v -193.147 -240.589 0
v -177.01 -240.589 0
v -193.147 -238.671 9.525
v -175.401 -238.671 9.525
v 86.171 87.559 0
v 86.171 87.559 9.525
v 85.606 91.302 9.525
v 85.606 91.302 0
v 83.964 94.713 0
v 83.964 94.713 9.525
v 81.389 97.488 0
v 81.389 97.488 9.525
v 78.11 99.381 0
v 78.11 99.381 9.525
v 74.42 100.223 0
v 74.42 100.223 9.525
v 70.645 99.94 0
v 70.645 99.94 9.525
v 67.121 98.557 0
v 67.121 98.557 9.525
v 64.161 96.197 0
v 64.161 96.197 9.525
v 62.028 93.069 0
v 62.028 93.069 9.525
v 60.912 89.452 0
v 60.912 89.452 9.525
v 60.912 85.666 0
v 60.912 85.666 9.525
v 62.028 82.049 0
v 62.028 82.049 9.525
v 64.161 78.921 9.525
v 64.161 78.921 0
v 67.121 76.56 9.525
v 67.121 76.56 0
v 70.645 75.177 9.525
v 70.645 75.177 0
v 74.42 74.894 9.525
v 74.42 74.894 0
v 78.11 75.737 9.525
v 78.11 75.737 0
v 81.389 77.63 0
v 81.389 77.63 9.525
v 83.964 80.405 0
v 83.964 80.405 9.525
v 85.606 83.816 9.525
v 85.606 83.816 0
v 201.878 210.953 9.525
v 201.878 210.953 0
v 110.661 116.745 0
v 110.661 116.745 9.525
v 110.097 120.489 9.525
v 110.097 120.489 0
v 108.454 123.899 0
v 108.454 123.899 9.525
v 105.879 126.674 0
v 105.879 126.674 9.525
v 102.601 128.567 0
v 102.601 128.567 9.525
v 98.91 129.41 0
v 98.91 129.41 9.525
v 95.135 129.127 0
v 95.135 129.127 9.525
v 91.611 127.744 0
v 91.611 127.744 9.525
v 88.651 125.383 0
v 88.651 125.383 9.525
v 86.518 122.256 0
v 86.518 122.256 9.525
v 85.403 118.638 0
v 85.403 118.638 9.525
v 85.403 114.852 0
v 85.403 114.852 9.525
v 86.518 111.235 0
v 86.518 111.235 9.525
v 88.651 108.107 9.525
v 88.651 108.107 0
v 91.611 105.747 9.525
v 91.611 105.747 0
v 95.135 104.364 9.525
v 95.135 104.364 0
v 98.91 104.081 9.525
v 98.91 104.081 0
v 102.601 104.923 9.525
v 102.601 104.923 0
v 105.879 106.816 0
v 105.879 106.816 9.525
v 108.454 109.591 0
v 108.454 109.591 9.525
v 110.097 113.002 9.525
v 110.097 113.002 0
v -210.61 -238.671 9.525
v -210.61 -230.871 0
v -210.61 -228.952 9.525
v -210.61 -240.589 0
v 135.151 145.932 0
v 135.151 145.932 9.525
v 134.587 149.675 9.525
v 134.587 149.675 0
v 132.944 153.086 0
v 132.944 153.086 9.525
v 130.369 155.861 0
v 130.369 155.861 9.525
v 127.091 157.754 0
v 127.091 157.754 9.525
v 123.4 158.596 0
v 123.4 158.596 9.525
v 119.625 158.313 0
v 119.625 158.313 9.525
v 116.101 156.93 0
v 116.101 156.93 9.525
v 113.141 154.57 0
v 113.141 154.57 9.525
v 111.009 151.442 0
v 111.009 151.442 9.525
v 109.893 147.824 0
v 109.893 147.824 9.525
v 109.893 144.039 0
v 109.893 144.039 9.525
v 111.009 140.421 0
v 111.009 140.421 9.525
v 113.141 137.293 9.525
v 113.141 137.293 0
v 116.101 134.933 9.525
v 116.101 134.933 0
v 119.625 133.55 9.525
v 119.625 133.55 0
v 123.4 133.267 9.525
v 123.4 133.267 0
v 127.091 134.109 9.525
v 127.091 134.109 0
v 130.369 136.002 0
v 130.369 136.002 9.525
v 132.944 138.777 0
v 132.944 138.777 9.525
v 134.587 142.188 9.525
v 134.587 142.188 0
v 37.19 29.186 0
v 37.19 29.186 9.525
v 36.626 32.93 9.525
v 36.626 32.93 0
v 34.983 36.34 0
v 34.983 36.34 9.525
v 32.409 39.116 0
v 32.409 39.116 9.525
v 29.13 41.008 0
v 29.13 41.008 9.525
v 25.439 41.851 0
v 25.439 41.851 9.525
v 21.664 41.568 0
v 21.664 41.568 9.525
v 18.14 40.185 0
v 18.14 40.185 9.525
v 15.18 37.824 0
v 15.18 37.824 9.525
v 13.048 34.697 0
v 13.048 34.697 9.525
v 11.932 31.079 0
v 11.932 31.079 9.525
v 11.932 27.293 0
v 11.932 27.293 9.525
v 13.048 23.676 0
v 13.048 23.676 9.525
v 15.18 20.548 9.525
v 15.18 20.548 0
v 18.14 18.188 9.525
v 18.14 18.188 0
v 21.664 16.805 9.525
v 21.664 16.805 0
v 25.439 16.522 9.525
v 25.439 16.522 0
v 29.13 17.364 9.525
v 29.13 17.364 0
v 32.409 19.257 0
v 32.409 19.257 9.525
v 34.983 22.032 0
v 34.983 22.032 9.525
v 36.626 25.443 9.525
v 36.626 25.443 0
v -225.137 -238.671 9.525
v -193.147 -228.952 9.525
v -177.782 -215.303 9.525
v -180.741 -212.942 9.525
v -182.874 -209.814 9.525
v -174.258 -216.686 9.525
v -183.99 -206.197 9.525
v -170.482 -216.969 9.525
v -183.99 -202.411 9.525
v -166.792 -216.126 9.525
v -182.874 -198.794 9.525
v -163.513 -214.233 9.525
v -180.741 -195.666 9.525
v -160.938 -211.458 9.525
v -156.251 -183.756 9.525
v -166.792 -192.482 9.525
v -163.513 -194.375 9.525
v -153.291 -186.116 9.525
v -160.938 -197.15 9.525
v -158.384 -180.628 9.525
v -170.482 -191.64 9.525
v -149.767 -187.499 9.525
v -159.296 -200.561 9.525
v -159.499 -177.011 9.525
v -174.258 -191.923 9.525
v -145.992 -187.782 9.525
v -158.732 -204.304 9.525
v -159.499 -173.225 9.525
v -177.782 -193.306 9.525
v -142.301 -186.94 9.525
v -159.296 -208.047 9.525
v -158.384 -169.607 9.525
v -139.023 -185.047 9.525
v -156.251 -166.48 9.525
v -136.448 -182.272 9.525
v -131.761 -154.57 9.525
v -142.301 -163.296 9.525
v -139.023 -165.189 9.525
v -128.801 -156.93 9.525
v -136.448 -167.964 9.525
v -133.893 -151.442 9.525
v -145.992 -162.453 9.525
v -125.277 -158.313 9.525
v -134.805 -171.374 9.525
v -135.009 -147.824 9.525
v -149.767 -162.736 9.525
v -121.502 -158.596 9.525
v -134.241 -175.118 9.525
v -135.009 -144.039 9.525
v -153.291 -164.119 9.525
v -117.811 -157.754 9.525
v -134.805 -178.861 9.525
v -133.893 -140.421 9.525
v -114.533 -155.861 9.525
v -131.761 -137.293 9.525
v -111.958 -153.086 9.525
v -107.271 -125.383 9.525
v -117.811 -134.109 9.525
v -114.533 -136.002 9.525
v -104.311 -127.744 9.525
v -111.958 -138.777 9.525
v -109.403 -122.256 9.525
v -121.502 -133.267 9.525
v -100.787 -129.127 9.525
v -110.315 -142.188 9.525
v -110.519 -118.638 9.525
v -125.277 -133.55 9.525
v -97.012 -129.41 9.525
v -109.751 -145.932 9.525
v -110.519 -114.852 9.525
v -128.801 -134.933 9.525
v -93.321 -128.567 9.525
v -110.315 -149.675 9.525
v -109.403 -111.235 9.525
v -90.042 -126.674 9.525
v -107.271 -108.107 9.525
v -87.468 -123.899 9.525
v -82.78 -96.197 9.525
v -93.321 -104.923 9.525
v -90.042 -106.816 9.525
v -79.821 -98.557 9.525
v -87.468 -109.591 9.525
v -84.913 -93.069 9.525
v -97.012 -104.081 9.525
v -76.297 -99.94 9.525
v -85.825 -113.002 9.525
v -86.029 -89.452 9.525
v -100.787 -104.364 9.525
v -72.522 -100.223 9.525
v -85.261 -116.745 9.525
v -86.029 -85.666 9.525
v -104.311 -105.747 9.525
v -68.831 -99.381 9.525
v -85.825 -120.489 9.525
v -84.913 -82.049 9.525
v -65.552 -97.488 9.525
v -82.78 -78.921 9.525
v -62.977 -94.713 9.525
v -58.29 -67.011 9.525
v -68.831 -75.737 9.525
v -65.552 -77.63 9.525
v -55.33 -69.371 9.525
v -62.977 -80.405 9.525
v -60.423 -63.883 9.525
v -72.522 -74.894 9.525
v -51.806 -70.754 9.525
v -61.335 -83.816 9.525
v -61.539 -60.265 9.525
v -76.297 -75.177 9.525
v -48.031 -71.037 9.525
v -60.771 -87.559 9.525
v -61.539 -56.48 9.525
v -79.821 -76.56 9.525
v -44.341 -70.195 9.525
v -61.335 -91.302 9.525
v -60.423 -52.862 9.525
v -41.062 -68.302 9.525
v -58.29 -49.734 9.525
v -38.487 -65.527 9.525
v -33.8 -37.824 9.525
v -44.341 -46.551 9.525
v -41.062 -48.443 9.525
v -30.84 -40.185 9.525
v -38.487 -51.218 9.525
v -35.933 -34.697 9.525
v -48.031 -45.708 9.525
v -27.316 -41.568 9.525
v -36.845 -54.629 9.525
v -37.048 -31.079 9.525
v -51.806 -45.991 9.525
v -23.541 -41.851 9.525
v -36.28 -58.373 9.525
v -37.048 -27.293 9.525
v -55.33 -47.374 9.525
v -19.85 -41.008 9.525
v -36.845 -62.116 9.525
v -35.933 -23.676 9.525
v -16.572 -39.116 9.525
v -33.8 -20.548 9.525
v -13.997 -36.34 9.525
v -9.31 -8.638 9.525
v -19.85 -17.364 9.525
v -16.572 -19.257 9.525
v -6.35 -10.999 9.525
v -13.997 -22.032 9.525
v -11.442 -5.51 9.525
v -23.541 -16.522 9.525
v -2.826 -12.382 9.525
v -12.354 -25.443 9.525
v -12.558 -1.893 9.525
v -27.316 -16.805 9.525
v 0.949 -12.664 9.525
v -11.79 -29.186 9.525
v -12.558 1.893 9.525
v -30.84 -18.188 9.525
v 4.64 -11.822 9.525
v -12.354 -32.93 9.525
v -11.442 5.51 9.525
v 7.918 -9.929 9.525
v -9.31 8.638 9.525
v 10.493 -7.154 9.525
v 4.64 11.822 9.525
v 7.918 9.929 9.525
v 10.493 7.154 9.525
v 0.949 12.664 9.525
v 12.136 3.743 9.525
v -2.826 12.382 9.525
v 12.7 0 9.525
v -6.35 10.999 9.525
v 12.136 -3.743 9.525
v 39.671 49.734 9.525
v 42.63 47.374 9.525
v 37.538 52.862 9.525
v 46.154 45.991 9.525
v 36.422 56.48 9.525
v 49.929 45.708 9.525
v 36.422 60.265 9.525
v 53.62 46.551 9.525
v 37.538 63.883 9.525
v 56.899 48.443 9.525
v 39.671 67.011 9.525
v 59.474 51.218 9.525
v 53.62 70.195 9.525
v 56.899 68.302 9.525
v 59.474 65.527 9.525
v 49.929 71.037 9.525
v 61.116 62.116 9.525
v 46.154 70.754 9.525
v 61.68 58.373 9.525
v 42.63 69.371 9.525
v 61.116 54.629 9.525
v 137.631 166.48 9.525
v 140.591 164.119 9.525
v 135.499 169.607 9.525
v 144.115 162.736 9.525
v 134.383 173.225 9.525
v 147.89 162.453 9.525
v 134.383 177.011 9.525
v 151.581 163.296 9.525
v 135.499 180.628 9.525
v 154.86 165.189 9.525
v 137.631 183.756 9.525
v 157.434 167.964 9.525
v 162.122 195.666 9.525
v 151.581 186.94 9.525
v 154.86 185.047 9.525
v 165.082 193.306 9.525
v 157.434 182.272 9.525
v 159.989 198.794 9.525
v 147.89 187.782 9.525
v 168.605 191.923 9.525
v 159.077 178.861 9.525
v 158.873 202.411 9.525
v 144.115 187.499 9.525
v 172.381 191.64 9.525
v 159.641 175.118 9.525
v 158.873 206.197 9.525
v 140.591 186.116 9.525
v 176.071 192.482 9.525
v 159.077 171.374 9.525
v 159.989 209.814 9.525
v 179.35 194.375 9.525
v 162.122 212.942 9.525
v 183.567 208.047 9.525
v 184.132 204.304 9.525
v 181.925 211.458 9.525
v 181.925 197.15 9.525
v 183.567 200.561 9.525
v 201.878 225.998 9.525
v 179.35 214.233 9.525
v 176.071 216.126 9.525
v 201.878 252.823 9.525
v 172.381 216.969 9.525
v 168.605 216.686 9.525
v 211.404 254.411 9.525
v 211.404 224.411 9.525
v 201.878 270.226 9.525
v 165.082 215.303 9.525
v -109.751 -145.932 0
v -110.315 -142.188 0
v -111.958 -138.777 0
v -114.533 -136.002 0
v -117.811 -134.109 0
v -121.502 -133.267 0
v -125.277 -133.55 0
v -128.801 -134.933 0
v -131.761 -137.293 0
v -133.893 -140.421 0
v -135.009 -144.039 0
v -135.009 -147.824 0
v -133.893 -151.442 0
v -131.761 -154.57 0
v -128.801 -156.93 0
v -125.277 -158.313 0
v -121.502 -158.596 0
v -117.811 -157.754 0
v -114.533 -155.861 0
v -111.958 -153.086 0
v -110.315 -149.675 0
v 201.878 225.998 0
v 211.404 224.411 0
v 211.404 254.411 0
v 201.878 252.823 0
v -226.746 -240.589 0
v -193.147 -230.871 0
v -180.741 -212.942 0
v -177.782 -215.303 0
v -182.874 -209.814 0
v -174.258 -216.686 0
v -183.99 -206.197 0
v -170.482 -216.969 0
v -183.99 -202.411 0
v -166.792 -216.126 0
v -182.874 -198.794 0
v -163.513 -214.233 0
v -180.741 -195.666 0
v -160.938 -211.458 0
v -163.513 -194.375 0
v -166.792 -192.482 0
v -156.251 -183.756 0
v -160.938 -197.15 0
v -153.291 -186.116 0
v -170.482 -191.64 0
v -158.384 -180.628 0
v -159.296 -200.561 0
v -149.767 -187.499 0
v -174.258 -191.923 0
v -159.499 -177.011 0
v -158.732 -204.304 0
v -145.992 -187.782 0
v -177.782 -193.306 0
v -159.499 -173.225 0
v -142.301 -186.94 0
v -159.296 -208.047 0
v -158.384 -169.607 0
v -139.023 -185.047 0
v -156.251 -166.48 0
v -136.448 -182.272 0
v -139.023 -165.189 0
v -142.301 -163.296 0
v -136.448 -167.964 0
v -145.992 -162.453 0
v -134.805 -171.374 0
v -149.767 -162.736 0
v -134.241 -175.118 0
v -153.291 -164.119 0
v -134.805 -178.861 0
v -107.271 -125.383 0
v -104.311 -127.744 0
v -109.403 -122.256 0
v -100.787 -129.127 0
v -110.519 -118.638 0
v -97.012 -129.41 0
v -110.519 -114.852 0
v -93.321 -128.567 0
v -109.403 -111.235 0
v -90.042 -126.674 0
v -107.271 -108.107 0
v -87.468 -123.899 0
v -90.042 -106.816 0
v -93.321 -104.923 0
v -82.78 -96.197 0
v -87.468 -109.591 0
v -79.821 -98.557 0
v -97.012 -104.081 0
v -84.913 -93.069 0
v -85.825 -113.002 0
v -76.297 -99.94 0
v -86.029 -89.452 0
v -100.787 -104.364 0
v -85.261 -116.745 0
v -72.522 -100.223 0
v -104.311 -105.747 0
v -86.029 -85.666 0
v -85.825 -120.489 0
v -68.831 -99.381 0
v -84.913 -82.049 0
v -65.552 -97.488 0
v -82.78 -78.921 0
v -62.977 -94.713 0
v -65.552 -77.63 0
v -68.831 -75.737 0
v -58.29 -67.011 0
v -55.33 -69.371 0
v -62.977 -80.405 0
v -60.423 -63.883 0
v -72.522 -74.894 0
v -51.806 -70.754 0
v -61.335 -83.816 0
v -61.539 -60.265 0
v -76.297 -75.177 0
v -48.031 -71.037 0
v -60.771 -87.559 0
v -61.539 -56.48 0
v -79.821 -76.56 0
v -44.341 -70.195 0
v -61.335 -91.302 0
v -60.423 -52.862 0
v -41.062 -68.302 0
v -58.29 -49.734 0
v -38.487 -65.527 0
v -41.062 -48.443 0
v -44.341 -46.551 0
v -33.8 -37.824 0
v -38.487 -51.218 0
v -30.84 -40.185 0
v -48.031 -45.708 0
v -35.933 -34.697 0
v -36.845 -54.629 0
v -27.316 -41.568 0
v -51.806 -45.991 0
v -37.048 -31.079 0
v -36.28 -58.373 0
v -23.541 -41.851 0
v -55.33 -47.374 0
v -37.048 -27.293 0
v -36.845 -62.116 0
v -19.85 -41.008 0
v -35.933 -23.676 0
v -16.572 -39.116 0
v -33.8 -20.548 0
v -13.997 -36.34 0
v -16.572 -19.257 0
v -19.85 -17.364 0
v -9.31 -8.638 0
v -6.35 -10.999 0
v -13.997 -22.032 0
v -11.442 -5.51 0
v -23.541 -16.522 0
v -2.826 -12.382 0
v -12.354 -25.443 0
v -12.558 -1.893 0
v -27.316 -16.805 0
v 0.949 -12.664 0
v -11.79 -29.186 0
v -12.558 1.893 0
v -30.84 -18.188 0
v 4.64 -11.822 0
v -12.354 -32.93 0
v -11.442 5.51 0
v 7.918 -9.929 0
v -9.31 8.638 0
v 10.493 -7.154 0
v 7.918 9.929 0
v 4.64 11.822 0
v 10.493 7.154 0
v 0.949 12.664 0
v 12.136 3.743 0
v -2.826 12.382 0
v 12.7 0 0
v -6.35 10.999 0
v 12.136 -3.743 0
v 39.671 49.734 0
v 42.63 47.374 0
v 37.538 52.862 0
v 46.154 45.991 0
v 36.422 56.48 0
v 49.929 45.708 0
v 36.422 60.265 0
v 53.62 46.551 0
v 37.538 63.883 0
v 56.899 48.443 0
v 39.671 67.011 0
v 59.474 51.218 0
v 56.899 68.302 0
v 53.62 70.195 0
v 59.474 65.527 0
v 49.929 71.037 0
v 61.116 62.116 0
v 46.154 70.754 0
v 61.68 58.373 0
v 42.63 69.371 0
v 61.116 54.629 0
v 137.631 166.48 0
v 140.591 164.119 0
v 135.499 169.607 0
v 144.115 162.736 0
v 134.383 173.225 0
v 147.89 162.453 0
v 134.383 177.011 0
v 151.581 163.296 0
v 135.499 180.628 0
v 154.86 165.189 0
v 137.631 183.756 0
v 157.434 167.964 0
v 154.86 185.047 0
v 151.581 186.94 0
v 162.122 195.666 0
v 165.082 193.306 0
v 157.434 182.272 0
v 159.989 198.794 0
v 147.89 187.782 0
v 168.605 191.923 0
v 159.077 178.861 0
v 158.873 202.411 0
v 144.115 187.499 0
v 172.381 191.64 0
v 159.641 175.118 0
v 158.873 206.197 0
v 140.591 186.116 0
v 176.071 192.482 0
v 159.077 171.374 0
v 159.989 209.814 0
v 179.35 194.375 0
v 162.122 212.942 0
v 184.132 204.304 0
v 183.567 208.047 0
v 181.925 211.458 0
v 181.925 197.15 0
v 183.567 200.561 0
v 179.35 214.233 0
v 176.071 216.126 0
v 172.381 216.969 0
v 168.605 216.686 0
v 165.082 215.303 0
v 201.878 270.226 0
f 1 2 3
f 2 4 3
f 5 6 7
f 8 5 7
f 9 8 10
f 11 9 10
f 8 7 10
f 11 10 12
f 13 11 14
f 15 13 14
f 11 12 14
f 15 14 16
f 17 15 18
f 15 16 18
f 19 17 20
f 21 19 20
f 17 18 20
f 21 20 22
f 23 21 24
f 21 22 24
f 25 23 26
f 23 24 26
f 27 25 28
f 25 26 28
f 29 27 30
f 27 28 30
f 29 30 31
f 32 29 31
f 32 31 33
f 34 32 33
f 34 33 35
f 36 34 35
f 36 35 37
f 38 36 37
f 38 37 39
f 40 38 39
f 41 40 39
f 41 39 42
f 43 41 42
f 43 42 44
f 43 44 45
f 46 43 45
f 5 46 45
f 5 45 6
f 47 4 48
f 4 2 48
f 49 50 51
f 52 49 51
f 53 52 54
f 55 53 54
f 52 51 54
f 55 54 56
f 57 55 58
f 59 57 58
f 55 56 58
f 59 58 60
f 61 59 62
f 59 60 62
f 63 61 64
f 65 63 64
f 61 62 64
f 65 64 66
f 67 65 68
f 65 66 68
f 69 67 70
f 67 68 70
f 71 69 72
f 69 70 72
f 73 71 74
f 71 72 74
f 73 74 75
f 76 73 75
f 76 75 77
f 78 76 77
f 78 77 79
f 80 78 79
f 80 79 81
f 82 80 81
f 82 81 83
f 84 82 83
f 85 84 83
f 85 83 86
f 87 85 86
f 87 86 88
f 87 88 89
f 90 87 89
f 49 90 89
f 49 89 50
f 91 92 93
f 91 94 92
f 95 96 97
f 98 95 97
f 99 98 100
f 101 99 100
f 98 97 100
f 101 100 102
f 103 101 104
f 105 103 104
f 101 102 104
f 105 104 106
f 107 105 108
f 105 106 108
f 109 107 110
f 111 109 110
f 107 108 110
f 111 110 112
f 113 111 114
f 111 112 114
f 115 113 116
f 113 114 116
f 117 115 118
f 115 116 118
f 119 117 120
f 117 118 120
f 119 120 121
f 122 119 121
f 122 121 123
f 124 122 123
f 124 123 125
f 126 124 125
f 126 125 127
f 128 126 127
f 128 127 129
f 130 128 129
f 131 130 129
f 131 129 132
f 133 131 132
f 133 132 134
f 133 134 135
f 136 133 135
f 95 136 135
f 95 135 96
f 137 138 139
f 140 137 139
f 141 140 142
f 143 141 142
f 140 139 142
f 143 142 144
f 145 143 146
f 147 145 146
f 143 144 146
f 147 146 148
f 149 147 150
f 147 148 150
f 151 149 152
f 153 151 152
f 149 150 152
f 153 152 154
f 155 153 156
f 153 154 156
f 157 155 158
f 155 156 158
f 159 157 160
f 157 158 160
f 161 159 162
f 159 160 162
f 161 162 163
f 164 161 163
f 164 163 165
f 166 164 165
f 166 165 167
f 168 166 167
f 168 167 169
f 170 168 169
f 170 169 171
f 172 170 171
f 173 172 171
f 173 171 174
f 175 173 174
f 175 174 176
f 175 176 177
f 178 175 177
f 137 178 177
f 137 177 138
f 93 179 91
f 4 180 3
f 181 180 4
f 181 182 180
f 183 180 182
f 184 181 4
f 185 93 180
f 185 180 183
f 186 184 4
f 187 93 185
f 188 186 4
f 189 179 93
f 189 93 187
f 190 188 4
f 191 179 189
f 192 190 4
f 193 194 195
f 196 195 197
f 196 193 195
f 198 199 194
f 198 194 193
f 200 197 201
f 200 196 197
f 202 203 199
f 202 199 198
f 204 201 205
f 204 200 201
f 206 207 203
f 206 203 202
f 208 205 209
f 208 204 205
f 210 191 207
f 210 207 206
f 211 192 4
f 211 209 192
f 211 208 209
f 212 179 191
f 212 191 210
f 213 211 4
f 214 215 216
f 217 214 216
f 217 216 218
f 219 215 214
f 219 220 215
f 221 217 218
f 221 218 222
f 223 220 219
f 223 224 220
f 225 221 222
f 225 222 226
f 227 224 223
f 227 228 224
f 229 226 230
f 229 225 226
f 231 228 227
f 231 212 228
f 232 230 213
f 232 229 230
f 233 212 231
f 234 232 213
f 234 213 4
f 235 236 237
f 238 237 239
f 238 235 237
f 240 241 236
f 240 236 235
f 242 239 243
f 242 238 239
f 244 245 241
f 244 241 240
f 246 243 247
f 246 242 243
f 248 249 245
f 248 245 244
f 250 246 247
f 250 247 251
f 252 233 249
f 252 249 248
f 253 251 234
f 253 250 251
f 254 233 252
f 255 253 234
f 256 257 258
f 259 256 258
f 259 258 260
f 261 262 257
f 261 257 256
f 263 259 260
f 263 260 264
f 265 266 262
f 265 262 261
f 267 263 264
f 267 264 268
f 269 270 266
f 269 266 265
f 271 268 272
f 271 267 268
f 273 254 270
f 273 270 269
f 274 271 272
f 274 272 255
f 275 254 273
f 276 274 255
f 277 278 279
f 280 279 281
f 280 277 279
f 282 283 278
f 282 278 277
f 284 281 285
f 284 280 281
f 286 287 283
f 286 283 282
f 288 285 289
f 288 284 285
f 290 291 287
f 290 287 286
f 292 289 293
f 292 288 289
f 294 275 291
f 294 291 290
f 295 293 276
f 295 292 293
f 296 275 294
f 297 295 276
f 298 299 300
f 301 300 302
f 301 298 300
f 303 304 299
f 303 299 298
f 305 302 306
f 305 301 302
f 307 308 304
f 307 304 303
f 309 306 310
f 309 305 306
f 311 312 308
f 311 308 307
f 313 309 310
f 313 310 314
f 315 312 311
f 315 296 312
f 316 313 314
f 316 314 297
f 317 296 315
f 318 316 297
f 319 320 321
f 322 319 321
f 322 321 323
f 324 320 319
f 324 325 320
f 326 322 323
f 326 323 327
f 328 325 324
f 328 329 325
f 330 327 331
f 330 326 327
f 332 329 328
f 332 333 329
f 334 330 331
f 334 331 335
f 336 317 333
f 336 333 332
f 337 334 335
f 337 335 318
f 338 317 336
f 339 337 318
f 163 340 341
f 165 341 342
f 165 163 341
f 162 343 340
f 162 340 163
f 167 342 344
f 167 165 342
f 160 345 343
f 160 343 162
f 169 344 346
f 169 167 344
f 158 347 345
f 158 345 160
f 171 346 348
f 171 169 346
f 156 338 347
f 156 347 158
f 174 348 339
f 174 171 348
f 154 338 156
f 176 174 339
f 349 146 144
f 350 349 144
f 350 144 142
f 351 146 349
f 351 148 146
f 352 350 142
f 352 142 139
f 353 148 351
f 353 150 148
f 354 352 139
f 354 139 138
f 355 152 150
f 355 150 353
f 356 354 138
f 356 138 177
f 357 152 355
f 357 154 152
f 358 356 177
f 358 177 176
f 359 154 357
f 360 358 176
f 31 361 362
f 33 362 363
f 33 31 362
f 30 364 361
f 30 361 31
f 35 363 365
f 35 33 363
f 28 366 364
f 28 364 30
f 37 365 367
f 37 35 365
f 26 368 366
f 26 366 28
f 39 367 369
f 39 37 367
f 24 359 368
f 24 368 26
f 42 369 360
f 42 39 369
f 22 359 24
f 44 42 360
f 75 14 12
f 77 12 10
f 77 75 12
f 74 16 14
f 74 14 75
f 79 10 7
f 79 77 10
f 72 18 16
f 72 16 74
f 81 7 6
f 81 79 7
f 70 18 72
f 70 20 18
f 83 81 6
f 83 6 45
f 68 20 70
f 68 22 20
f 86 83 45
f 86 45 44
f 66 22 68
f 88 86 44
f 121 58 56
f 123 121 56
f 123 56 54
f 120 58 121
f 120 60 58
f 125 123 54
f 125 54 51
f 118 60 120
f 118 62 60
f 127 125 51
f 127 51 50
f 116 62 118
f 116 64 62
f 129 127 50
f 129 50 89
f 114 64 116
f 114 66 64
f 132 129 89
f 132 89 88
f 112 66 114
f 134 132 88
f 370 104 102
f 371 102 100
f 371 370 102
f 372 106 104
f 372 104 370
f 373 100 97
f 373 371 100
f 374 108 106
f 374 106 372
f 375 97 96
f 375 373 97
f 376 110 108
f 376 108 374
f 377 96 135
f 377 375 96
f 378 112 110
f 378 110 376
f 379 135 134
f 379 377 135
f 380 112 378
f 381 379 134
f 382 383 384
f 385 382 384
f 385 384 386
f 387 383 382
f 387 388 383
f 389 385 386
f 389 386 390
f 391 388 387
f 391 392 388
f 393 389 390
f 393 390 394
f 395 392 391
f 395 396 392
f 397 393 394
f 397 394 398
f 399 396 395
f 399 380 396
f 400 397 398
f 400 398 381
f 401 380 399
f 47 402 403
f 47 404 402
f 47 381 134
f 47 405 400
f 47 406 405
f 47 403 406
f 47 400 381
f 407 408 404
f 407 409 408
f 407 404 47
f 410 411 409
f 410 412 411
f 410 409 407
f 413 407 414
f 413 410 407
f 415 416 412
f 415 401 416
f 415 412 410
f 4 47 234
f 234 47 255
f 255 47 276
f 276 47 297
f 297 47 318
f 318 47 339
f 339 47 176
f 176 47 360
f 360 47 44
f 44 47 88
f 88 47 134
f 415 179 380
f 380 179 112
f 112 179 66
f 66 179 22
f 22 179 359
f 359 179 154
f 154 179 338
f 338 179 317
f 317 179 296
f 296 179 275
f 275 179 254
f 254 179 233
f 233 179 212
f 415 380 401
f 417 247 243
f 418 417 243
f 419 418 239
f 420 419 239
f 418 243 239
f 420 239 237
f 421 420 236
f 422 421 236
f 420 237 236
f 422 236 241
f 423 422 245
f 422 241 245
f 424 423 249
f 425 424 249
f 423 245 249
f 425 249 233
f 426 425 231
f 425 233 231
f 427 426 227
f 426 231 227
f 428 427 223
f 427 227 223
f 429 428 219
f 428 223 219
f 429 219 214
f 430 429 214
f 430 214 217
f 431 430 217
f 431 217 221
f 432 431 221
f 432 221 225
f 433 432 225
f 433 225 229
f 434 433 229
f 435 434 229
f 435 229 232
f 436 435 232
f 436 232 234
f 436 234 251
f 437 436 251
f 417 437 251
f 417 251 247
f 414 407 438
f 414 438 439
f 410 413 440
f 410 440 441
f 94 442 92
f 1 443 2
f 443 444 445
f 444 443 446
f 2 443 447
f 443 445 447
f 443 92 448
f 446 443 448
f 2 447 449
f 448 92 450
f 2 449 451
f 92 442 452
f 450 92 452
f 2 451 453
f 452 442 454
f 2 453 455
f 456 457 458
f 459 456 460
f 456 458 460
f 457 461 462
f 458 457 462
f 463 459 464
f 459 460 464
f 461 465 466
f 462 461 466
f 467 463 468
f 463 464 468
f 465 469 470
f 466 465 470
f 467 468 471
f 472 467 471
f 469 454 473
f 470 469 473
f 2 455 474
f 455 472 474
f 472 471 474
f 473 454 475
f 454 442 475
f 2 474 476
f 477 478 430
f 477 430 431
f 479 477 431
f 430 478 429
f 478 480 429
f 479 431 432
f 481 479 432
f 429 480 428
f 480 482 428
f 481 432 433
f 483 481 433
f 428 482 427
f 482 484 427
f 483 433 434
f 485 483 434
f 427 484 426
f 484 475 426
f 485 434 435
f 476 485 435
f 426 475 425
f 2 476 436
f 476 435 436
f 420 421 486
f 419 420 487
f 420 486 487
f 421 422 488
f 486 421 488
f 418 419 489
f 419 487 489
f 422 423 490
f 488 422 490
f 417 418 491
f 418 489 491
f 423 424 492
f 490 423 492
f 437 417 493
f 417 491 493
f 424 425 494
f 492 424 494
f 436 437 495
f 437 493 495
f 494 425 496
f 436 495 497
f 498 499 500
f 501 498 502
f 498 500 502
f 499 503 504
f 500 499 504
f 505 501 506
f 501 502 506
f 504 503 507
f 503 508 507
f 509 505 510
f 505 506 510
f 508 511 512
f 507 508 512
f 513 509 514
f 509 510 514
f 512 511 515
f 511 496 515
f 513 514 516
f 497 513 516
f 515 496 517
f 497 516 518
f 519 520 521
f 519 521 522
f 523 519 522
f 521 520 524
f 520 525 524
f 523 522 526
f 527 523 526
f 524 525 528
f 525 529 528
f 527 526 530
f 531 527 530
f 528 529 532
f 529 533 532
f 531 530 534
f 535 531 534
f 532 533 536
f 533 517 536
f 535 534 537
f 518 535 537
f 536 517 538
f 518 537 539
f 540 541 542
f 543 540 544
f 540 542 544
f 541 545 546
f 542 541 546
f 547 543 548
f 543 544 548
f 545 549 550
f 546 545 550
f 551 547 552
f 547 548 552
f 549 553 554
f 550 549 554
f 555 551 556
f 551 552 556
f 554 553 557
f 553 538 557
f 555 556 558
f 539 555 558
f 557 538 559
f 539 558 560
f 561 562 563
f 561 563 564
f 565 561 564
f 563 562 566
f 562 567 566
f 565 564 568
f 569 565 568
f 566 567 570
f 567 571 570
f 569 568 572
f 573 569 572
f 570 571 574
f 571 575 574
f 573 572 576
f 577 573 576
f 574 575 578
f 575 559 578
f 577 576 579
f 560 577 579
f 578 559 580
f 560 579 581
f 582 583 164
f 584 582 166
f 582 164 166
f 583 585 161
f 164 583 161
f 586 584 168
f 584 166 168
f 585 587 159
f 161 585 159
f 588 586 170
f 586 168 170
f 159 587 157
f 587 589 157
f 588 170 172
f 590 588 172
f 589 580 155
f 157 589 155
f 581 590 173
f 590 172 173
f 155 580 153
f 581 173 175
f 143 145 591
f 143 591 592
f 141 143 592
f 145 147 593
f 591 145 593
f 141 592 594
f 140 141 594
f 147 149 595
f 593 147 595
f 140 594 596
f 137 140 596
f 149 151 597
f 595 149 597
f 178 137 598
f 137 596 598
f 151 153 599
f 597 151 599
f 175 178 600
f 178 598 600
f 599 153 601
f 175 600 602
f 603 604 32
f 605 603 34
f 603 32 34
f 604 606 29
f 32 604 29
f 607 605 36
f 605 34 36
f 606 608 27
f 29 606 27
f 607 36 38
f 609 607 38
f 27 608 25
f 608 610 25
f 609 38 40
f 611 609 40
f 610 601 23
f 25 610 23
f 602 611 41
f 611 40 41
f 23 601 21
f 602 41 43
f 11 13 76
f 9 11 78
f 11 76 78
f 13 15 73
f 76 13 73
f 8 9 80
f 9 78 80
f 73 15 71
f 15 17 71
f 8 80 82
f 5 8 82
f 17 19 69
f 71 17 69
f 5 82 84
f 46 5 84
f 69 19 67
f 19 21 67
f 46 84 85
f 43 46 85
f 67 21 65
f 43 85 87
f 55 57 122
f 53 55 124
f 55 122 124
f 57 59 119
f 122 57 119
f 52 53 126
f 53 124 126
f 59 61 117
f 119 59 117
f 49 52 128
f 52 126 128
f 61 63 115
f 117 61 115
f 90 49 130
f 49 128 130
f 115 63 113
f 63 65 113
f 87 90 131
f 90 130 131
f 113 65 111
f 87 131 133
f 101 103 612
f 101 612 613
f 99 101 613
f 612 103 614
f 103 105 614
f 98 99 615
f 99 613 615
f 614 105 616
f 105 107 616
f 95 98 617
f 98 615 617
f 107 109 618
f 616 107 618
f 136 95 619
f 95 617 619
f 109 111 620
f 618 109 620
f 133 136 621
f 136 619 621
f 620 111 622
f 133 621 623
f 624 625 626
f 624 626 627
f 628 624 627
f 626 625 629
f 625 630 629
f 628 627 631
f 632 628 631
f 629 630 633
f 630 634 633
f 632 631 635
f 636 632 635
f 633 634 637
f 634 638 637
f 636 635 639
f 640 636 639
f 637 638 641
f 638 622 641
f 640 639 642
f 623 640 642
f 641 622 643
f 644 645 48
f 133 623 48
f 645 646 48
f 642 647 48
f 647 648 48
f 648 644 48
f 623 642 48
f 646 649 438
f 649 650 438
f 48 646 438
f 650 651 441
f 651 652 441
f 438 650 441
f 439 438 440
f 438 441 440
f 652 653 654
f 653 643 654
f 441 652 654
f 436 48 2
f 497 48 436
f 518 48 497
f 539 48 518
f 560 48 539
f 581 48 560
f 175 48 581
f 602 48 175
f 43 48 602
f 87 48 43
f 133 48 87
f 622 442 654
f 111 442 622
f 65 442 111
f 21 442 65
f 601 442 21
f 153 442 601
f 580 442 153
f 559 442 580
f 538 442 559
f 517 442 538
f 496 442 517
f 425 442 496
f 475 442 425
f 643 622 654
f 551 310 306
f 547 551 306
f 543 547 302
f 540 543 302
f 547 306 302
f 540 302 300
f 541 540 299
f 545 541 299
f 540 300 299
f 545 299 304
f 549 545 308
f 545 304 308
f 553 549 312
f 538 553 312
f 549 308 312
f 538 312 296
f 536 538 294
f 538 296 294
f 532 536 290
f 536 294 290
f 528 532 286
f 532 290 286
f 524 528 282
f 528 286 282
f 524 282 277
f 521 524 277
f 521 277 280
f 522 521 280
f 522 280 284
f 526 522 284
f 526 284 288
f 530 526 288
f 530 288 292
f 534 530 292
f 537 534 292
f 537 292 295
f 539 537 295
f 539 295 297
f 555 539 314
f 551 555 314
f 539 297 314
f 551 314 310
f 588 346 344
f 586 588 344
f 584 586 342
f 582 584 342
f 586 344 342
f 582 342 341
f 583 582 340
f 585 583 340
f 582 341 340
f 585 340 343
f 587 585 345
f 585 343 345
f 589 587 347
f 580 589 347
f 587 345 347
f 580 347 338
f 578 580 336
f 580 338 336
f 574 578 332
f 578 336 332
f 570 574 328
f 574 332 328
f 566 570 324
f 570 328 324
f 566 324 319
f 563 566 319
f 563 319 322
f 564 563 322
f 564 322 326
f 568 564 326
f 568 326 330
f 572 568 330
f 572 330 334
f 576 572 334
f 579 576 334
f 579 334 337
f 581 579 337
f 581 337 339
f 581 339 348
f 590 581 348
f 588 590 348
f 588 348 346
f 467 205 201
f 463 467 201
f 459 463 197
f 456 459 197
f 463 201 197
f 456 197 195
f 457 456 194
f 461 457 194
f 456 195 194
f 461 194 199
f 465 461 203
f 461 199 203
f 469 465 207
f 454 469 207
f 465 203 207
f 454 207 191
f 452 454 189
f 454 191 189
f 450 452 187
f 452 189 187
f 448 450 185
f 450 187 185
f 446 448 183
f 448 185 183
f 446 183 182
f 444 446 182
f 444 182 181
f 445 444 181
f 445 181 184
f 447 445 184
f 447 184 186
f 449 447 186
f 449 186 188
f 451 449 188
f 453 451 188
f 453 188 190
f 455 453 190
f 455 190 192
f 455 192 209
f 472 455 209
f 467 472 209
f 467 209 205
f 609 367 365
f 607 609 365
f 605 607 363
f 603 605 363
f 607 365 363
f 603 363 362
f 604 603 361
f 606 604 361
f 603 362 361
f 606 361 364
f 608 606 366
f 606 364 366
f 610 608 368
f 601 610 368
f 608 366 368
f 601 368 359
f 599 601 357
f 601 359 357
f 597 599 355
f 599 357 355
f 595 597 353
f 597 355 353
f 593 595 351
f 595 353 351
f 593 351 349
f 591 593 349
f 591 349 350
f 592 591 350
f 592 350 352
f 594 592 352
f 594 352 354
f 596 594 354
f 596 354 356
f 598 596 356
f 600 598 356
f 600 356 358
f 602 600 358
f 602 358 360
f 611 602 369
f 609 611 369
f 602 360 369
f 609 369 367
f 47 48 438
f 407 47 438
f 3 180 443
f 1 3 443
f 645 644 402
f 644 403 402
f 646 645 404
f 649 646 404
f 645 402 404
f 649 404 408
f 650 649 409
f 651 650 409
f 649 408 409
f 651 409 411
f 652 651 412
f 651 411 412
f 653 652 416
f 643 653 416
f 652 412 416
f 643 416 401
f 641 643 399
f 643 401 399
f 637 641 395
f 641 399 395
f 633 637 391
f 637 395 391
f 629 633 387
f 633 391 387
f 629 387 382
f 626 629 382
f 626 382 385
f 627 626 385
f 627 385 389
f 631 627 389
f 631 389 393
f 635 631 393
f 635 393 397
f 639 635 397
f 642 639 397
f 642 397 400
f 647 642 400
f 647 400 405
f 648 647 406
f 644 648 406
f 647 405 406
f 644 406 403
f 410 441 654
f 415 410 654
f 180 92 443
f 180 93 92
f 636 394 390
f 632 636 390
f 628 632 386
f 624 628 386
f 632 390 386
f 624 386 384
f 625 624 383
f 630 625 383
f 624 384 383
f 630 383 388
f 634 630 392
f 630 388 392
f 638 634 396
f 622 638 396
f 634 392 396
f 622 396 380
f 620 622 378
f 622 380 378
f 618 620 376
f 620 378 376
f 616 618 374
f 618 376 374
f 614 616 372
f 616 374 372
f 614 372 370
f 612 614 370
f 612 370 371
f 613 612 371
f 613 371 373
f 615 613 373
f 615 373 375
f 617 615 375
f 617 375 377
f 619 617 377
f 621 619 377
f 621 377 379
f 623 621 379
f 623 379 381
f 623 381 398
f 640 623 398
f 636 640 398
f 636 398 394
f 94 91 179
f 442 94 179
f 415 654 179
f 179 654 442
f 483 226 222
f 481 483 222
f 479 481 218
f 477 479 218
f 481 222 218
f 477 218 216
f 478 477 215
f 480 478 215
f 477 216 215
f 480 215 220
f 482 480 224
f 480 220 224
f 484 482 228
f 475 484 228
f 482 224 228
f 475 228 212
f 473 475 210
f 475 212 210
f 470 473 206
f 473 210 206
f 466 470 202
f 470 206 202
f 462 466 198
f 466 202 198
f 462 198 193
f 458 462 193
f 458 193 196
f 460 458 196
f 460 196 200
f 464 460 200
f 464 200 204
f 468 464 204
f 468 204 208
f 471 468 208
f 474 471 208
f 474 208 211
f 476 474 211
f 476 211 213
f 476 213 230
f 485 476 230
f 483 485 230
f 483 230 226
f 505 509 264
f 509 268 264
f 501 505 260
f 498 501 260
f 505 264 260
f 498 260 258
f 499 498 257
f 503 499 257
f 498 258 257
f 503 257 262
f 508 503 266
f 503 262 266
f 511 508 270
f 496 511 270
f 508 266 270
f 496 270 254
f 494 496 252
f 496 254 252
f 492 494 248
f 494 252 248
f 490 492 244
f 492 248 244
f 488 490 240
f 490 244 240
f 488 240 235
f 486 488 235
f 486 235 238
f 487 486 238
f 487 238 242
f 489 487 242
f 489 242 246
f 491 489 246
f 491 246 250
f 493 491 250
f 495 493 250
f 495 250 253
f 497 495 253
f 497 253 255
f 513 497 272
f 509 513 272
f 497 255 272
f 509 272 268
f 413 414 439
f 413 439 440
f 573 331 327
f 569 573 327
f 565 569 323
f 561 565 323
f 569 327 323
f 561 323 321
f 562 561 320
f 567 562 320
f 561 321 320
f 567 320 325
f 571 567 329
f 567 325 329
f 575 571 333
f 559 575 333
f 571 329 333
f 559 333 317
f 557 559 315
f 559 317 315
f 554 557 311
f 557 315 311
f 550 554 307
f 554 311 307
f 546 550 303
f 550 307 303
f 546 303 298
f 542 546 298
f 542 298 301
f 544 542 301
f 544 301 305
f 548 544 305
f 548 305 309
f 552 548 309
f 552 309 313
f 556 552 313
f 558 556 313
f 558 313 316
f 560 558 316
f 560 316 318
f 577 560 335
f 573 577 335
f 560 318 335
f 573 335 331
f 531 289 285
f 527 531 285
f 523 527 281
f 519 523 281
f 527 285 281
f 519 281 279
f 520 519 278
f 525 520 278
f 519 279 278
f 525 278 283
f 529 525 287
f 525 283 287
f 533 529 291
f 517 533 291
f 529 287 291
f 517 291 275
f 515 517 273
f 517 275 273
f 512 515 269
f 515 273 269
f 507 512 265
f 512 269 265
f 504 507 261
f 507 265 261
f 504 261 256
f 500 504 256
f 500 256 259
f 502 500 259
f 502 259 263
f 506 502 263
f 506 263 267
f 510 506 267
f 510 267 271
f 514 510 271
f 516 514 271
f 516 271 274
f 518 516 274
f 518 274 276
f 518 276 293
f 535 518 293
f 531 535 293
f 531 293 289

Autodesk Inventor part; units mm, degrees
ref_plane "YZ Plane" through (0, 0, 0) normal (1, 0, 0) x (0, 1, 0)
ref_plane "XZ Plane" through (0, 0, 0) normal (0, 1, 0) x (-1, 0, 0)
ref_plane "XY Plane" through (0, 0, 0) normal (0, 0, 1) x (1, 0, 0)
sketch "Sketch1" plane through (0, 0, 0) normal (0, 0, 1) x (1, 0, 0)
  line L0 (201.8785, 270.226) -> (-226.7465, -240.5894)
  line L1 (-226.7465, -240.5894) -> (-177.0105, -240.5894)
  line L2 (-177.0105, -240.5894) -> (201.8785, 210.9529)
  line L3 (201.8785, 210.9529) -> (201.8785, 270.226)
  line L4 (-12.434, 14.8183) -> (12.434, -14.8183) construction
  point P0 (0, 0)
  point P1 (0, 0)
  dimension "d0" = 50
  dimension "d1" = 38.1
  dimension "d2" = 428.625
extrude "Extrusion1" add sketch "Sketch1" along normal blind 9.525
sketch "Sketch2" plane through (0, 0, 9.525) normal (0, 0, 1) x (1, 0, 0)
  line L0 (201.8785, 210.9529) -> (201.8785, 270.226) projected
  line L1 (201.8785, 225.9981) -> (211.4035, 224.4106)
  line L2 (211.4035, 224.4106) -> (211.4035, 254.4106)
  line L3 (211.4035, 254.4106) -> (201.8785, 252.8231)
  line L4 (-226.7465, -240.5894) -> (-177.0105, -240.5894) projected
  point P0 (0, 0)
  point P1 (211.4035, 239.4106)
  dimension "d5" = 480
  dimension "d6" = 9.525
  dimension "d8" = 1.5875
  dimension "d9" = 30
extrude "Extrusion2" add sketch "Sketch2" against normal up to surface (9.525 mm away)
sketch "Sketch3" plane through (0, 0, 9.525) normal (0, 0, 1) x (1, 0, 0)
  circle A0 centre (0, 0) radius 12.7
  line L0 (201.8785, 270.226) -> (-226.7465, -240.5894) projected
  circle A1 centre (-24.4902, -29.1863) radius 12.7
  circle A2 centre (-48.9804, -58.3726) radius 12.7
  circle A3 centre (-73.4706, -87.5589) radius 12.7
  circle A4 centre (-97.9608, -116.7452) radius 12.7
  circle A5 centre (-122.451, -145.9315) radius 12.7
  circle A6 centre (-146.9412, -175.1178) radius 12.7
  circle A7 centre (-171.4315, -204.3041) radius 12.7
  circle A8 centre (24.4902, 29.1863) radius 12.7
  circle A9 centre (0, 0) radius 12.7
  circle A10 centre (-24.4902, -29.1863) radius 12.7
  circle A11 centre (-48.9804, -58.3726) radius 12.7
  circle A12 centre (-73.4706, -87.5589) radius 12.7
  circle A13 centre (-97.9608, -116.7452) radius 12.7
  circle A14 centre (-122.451, -145.9315) radius 12.7
  circle A15 centre (-146.9412, -175.1178) radius 12.7
  circle A16 centre (48.9804, 58.3726) radius 12.7
  circle A17 centre (24.4902, 29.1863) radius 12.7
  circle A18 centre (0, 0) radius 12.7
  circle A19 centre (-24.4902, -29.1863) radius 12.7
  circle A20 centre (-48.9804, -58.3726) radius 12.7
  circle A21 centre (-73.4706, -87.5589) radius 12.7
  circle A22 centre (-97.9608, -116.7452) radius 12.7
  circle A23 centre (-122.451, -145.9315) radius 12.7
  circle A24 centre (73.4706, 87.5589) radius 12.7
  circle A25 centre (48.9804, 58.3726) radius 12.7
  circle A26 centre (24.4902, 29.1863) radius 12.7
  circle A27 centre (0, 0) radius 12.7
  circle A28 centre (-24.4902, -29.1863) radius 12.7
  circle A29 centre (-48.9804, -58.3726) radius 12.7
  circle A30 centre (-73.4706, -87.5589) radius 12.7
  circle A31 centre (-97.9608, -116.7452) radius 12.7
  circle A32 centre (97.9608, 116.7452) radius 12.7
  circle A33 centre (73.4706, 87.5589) radius 12.7
  circle A34 centre (48.9804, 58.3726) radius 12.7
  circle A35 centre (24.4902, 29.1863) radius 12.7
  circle A36 centre (0, 0) radius 12.7
  circle A37 centre (-24.4902, -29.1863) radius 12.7
  circle A38 centre (-48.9804, -58.3726) radius 12.7
  circle A39 centre (-73.4706, -87.5589) radius 12.7
  circle A40 centre (122.451, 145.9315) radius 12.7
  circle A41 centre (97.9608, 116.7452) radius 12.7
  circle A42 centre (73.4706, 87.5589) radius 12.7
  circle A43 centre (48.9804, 58.3726) radius 12.7
  circle A44 centre (24.4902, 29.1863) radius 12.7
  circle A45 centre (0, 0) radius 12.7
  circle A46 centre (-24.4902, -29.1863) radius 12.7
  circle A47 centre (-48.9804, -58.3726) radius 12.7
  circle A48 centre (146.9412, 175.1178) radius 12.7
  circle A49 centre (122.451, 145.9315) radius 12.7
  circle A50 centre (97.9608, 116.7452) radius 12.7
  circle A51 centre (73.4706, 87.5589) radius 12.7
  circle A52 centre (48.9804, 58.3726) radius 12.7
  circle A53 centre (24.4902, 29.1863) radius 12.7
  circle A54 centre (0, 0) radius 12.7
  circle A55 centre (-24.4902, -29.1863) radius 12.7
  circle A56 centre (171.4315, 204.3041) radius 12.7
  circle A57 centre (146.9412, 175.1178) radius 12.7
  circle A58 centre (122.451, 145.9315) radius 12.7
  circle A59 centre (97.9608, 116.7452) radius 12.7
  circle A60 centre (73.4706, 87.5589) radius 12.7
  circle A61 centre (48.9804, 58.3726) radius 12.7
  circle A62 centre (24.4902, 29.1863) radius 12.7
  circle A63 centre (0, 0) radius 12.7
  dimension "d12" = 25.4
  dimension "d15" = 38.1
  dimension "d18" = 38.1
extrude "Extrusion3" cut sketch "Sketch3" against normal through all
chamfer "Chamfer1" distance 9.525 angle 11.388 1 edges at (-201.8785, -240.5894, 9.525) measured on face at (-210.1678, -240.5894, 3.175)
sketch "Sketch4" plane through (-226.7465, -240.5894, 0) normal (0, -0.9803, 0.1975) x (1, 0, 0)
  line L0 (33.5993, 0) -> (16.1368, 0)
  line L1 (16.1368, 0) -> (16.1368, 17.2439)
  line L2 (16.1368, 17.2439) -> (33.5993, 17.2439)
  line L3 (33.5993, 17.2439) -> (33.5993, 0)
  line L4 (51.3458, 9.7163) -> (1.6098, 9.7163) projected
  line L5 (51.3458, 9.7163) -> (428.625, 98.4954) projected
  line L6 (428.625, 98.4954) -> (428.625, 101.4661) projected
  line L7 (428.625, 101.4661) -> (438.15, 101.1527) projected
  line L8 (438.15, 101.1527) -> (438.15, 107.0762) projected
  line L9 (438.15, 107.0762) -> (428.625, 106.7628) projected
  line L10 (428.625, 106.7628) -> (428.625, 110.199) projected
  line L11 (428.625, 110.199) -> (1.6098, 9.7163) projected
  ellipse E0 centre (202.2563, 51.0795) end of major axis (214.9563, 51.0795) minor radius 2.5076 projected
  ellipse E1 centre (128.7857, 33.7908) end of major axis (141.4857, 33.7908) minor radius 2.5076 projected
  ellipse E2 centre (55.315, 16.5021) end of major axis (68.015, 16.5021) minor radius 2.5076 projected
  ellipse E3 centre (79.8053, 22.265) end of major axis (92.5053, 22.265) minor radius 2.5076 projected
  ellipse E4 centre (373.6878, 91.4197) end of major axis (386.3878, 91.4197) minor radius 2.5076 projected
  ellipse E5 centre (251.2367, 62.6052) end of major axis (263.9367, 62.6052) minor radius 2.5076 projected
  ellipse E6 centre (300.2171, 74.131) end of major axis (312.9171, 74.131) minor radius 2.5076 projected
  ellipse E7 centre (177.7661, 45.3166) end of major axis (190.4661, 45.3166) minor radius 2.5076 projected
  ellipse E8 centre (153.2759, 39.5537) end of major axis (165.9759, 39.5537) minor radius 2.5076 projected
  ellipse E9 centre (275.7269, 68.3681) end of major axis (288.4269, 68.3681) minor radius 2.5076 projected
  ellipse E10 centre (324.7073, 79.8939) end of major axis (337.4073, 79.8939) minor radius 2.5076 projected
  ellipse E11 centre (226.7465, 56.8423) end of major axis (239.4465, 56.8423) minor radius 2.5076 projected
  ellipse E12 centre (398.178, 97.1826) end of major axis (410.878, 97.1826) minor radius 2.5076 projected
  ellipse E13 centre (104.2955, 28.0279) end of major axis (116.9955, 28.0279) minor radius 2.5076 projected
  ellipse E14 centre (349.1975, 85.6568) end of major axis (361.8975, 85.6568) minor radius 2.5076 projected
  line L12 (0, 0) -> (49.736, 0) projected
  point P0 (226.7465, 47.5049)
  point P1 (24.868, 0)
  point P2 (16.1368, 13.1347)
  dimension "d26" = 17.4625
extrude "Extrusion4" cut sketch "Sketch4" against normal blind 9.525 contours L0 L1 L4 L3 | L4 L1 L11 L3
equation "\"d8\" = 0.166667 * d6"
properties part number "SUPPORTS_TREBUCHET" material "Wood (Birch)"
